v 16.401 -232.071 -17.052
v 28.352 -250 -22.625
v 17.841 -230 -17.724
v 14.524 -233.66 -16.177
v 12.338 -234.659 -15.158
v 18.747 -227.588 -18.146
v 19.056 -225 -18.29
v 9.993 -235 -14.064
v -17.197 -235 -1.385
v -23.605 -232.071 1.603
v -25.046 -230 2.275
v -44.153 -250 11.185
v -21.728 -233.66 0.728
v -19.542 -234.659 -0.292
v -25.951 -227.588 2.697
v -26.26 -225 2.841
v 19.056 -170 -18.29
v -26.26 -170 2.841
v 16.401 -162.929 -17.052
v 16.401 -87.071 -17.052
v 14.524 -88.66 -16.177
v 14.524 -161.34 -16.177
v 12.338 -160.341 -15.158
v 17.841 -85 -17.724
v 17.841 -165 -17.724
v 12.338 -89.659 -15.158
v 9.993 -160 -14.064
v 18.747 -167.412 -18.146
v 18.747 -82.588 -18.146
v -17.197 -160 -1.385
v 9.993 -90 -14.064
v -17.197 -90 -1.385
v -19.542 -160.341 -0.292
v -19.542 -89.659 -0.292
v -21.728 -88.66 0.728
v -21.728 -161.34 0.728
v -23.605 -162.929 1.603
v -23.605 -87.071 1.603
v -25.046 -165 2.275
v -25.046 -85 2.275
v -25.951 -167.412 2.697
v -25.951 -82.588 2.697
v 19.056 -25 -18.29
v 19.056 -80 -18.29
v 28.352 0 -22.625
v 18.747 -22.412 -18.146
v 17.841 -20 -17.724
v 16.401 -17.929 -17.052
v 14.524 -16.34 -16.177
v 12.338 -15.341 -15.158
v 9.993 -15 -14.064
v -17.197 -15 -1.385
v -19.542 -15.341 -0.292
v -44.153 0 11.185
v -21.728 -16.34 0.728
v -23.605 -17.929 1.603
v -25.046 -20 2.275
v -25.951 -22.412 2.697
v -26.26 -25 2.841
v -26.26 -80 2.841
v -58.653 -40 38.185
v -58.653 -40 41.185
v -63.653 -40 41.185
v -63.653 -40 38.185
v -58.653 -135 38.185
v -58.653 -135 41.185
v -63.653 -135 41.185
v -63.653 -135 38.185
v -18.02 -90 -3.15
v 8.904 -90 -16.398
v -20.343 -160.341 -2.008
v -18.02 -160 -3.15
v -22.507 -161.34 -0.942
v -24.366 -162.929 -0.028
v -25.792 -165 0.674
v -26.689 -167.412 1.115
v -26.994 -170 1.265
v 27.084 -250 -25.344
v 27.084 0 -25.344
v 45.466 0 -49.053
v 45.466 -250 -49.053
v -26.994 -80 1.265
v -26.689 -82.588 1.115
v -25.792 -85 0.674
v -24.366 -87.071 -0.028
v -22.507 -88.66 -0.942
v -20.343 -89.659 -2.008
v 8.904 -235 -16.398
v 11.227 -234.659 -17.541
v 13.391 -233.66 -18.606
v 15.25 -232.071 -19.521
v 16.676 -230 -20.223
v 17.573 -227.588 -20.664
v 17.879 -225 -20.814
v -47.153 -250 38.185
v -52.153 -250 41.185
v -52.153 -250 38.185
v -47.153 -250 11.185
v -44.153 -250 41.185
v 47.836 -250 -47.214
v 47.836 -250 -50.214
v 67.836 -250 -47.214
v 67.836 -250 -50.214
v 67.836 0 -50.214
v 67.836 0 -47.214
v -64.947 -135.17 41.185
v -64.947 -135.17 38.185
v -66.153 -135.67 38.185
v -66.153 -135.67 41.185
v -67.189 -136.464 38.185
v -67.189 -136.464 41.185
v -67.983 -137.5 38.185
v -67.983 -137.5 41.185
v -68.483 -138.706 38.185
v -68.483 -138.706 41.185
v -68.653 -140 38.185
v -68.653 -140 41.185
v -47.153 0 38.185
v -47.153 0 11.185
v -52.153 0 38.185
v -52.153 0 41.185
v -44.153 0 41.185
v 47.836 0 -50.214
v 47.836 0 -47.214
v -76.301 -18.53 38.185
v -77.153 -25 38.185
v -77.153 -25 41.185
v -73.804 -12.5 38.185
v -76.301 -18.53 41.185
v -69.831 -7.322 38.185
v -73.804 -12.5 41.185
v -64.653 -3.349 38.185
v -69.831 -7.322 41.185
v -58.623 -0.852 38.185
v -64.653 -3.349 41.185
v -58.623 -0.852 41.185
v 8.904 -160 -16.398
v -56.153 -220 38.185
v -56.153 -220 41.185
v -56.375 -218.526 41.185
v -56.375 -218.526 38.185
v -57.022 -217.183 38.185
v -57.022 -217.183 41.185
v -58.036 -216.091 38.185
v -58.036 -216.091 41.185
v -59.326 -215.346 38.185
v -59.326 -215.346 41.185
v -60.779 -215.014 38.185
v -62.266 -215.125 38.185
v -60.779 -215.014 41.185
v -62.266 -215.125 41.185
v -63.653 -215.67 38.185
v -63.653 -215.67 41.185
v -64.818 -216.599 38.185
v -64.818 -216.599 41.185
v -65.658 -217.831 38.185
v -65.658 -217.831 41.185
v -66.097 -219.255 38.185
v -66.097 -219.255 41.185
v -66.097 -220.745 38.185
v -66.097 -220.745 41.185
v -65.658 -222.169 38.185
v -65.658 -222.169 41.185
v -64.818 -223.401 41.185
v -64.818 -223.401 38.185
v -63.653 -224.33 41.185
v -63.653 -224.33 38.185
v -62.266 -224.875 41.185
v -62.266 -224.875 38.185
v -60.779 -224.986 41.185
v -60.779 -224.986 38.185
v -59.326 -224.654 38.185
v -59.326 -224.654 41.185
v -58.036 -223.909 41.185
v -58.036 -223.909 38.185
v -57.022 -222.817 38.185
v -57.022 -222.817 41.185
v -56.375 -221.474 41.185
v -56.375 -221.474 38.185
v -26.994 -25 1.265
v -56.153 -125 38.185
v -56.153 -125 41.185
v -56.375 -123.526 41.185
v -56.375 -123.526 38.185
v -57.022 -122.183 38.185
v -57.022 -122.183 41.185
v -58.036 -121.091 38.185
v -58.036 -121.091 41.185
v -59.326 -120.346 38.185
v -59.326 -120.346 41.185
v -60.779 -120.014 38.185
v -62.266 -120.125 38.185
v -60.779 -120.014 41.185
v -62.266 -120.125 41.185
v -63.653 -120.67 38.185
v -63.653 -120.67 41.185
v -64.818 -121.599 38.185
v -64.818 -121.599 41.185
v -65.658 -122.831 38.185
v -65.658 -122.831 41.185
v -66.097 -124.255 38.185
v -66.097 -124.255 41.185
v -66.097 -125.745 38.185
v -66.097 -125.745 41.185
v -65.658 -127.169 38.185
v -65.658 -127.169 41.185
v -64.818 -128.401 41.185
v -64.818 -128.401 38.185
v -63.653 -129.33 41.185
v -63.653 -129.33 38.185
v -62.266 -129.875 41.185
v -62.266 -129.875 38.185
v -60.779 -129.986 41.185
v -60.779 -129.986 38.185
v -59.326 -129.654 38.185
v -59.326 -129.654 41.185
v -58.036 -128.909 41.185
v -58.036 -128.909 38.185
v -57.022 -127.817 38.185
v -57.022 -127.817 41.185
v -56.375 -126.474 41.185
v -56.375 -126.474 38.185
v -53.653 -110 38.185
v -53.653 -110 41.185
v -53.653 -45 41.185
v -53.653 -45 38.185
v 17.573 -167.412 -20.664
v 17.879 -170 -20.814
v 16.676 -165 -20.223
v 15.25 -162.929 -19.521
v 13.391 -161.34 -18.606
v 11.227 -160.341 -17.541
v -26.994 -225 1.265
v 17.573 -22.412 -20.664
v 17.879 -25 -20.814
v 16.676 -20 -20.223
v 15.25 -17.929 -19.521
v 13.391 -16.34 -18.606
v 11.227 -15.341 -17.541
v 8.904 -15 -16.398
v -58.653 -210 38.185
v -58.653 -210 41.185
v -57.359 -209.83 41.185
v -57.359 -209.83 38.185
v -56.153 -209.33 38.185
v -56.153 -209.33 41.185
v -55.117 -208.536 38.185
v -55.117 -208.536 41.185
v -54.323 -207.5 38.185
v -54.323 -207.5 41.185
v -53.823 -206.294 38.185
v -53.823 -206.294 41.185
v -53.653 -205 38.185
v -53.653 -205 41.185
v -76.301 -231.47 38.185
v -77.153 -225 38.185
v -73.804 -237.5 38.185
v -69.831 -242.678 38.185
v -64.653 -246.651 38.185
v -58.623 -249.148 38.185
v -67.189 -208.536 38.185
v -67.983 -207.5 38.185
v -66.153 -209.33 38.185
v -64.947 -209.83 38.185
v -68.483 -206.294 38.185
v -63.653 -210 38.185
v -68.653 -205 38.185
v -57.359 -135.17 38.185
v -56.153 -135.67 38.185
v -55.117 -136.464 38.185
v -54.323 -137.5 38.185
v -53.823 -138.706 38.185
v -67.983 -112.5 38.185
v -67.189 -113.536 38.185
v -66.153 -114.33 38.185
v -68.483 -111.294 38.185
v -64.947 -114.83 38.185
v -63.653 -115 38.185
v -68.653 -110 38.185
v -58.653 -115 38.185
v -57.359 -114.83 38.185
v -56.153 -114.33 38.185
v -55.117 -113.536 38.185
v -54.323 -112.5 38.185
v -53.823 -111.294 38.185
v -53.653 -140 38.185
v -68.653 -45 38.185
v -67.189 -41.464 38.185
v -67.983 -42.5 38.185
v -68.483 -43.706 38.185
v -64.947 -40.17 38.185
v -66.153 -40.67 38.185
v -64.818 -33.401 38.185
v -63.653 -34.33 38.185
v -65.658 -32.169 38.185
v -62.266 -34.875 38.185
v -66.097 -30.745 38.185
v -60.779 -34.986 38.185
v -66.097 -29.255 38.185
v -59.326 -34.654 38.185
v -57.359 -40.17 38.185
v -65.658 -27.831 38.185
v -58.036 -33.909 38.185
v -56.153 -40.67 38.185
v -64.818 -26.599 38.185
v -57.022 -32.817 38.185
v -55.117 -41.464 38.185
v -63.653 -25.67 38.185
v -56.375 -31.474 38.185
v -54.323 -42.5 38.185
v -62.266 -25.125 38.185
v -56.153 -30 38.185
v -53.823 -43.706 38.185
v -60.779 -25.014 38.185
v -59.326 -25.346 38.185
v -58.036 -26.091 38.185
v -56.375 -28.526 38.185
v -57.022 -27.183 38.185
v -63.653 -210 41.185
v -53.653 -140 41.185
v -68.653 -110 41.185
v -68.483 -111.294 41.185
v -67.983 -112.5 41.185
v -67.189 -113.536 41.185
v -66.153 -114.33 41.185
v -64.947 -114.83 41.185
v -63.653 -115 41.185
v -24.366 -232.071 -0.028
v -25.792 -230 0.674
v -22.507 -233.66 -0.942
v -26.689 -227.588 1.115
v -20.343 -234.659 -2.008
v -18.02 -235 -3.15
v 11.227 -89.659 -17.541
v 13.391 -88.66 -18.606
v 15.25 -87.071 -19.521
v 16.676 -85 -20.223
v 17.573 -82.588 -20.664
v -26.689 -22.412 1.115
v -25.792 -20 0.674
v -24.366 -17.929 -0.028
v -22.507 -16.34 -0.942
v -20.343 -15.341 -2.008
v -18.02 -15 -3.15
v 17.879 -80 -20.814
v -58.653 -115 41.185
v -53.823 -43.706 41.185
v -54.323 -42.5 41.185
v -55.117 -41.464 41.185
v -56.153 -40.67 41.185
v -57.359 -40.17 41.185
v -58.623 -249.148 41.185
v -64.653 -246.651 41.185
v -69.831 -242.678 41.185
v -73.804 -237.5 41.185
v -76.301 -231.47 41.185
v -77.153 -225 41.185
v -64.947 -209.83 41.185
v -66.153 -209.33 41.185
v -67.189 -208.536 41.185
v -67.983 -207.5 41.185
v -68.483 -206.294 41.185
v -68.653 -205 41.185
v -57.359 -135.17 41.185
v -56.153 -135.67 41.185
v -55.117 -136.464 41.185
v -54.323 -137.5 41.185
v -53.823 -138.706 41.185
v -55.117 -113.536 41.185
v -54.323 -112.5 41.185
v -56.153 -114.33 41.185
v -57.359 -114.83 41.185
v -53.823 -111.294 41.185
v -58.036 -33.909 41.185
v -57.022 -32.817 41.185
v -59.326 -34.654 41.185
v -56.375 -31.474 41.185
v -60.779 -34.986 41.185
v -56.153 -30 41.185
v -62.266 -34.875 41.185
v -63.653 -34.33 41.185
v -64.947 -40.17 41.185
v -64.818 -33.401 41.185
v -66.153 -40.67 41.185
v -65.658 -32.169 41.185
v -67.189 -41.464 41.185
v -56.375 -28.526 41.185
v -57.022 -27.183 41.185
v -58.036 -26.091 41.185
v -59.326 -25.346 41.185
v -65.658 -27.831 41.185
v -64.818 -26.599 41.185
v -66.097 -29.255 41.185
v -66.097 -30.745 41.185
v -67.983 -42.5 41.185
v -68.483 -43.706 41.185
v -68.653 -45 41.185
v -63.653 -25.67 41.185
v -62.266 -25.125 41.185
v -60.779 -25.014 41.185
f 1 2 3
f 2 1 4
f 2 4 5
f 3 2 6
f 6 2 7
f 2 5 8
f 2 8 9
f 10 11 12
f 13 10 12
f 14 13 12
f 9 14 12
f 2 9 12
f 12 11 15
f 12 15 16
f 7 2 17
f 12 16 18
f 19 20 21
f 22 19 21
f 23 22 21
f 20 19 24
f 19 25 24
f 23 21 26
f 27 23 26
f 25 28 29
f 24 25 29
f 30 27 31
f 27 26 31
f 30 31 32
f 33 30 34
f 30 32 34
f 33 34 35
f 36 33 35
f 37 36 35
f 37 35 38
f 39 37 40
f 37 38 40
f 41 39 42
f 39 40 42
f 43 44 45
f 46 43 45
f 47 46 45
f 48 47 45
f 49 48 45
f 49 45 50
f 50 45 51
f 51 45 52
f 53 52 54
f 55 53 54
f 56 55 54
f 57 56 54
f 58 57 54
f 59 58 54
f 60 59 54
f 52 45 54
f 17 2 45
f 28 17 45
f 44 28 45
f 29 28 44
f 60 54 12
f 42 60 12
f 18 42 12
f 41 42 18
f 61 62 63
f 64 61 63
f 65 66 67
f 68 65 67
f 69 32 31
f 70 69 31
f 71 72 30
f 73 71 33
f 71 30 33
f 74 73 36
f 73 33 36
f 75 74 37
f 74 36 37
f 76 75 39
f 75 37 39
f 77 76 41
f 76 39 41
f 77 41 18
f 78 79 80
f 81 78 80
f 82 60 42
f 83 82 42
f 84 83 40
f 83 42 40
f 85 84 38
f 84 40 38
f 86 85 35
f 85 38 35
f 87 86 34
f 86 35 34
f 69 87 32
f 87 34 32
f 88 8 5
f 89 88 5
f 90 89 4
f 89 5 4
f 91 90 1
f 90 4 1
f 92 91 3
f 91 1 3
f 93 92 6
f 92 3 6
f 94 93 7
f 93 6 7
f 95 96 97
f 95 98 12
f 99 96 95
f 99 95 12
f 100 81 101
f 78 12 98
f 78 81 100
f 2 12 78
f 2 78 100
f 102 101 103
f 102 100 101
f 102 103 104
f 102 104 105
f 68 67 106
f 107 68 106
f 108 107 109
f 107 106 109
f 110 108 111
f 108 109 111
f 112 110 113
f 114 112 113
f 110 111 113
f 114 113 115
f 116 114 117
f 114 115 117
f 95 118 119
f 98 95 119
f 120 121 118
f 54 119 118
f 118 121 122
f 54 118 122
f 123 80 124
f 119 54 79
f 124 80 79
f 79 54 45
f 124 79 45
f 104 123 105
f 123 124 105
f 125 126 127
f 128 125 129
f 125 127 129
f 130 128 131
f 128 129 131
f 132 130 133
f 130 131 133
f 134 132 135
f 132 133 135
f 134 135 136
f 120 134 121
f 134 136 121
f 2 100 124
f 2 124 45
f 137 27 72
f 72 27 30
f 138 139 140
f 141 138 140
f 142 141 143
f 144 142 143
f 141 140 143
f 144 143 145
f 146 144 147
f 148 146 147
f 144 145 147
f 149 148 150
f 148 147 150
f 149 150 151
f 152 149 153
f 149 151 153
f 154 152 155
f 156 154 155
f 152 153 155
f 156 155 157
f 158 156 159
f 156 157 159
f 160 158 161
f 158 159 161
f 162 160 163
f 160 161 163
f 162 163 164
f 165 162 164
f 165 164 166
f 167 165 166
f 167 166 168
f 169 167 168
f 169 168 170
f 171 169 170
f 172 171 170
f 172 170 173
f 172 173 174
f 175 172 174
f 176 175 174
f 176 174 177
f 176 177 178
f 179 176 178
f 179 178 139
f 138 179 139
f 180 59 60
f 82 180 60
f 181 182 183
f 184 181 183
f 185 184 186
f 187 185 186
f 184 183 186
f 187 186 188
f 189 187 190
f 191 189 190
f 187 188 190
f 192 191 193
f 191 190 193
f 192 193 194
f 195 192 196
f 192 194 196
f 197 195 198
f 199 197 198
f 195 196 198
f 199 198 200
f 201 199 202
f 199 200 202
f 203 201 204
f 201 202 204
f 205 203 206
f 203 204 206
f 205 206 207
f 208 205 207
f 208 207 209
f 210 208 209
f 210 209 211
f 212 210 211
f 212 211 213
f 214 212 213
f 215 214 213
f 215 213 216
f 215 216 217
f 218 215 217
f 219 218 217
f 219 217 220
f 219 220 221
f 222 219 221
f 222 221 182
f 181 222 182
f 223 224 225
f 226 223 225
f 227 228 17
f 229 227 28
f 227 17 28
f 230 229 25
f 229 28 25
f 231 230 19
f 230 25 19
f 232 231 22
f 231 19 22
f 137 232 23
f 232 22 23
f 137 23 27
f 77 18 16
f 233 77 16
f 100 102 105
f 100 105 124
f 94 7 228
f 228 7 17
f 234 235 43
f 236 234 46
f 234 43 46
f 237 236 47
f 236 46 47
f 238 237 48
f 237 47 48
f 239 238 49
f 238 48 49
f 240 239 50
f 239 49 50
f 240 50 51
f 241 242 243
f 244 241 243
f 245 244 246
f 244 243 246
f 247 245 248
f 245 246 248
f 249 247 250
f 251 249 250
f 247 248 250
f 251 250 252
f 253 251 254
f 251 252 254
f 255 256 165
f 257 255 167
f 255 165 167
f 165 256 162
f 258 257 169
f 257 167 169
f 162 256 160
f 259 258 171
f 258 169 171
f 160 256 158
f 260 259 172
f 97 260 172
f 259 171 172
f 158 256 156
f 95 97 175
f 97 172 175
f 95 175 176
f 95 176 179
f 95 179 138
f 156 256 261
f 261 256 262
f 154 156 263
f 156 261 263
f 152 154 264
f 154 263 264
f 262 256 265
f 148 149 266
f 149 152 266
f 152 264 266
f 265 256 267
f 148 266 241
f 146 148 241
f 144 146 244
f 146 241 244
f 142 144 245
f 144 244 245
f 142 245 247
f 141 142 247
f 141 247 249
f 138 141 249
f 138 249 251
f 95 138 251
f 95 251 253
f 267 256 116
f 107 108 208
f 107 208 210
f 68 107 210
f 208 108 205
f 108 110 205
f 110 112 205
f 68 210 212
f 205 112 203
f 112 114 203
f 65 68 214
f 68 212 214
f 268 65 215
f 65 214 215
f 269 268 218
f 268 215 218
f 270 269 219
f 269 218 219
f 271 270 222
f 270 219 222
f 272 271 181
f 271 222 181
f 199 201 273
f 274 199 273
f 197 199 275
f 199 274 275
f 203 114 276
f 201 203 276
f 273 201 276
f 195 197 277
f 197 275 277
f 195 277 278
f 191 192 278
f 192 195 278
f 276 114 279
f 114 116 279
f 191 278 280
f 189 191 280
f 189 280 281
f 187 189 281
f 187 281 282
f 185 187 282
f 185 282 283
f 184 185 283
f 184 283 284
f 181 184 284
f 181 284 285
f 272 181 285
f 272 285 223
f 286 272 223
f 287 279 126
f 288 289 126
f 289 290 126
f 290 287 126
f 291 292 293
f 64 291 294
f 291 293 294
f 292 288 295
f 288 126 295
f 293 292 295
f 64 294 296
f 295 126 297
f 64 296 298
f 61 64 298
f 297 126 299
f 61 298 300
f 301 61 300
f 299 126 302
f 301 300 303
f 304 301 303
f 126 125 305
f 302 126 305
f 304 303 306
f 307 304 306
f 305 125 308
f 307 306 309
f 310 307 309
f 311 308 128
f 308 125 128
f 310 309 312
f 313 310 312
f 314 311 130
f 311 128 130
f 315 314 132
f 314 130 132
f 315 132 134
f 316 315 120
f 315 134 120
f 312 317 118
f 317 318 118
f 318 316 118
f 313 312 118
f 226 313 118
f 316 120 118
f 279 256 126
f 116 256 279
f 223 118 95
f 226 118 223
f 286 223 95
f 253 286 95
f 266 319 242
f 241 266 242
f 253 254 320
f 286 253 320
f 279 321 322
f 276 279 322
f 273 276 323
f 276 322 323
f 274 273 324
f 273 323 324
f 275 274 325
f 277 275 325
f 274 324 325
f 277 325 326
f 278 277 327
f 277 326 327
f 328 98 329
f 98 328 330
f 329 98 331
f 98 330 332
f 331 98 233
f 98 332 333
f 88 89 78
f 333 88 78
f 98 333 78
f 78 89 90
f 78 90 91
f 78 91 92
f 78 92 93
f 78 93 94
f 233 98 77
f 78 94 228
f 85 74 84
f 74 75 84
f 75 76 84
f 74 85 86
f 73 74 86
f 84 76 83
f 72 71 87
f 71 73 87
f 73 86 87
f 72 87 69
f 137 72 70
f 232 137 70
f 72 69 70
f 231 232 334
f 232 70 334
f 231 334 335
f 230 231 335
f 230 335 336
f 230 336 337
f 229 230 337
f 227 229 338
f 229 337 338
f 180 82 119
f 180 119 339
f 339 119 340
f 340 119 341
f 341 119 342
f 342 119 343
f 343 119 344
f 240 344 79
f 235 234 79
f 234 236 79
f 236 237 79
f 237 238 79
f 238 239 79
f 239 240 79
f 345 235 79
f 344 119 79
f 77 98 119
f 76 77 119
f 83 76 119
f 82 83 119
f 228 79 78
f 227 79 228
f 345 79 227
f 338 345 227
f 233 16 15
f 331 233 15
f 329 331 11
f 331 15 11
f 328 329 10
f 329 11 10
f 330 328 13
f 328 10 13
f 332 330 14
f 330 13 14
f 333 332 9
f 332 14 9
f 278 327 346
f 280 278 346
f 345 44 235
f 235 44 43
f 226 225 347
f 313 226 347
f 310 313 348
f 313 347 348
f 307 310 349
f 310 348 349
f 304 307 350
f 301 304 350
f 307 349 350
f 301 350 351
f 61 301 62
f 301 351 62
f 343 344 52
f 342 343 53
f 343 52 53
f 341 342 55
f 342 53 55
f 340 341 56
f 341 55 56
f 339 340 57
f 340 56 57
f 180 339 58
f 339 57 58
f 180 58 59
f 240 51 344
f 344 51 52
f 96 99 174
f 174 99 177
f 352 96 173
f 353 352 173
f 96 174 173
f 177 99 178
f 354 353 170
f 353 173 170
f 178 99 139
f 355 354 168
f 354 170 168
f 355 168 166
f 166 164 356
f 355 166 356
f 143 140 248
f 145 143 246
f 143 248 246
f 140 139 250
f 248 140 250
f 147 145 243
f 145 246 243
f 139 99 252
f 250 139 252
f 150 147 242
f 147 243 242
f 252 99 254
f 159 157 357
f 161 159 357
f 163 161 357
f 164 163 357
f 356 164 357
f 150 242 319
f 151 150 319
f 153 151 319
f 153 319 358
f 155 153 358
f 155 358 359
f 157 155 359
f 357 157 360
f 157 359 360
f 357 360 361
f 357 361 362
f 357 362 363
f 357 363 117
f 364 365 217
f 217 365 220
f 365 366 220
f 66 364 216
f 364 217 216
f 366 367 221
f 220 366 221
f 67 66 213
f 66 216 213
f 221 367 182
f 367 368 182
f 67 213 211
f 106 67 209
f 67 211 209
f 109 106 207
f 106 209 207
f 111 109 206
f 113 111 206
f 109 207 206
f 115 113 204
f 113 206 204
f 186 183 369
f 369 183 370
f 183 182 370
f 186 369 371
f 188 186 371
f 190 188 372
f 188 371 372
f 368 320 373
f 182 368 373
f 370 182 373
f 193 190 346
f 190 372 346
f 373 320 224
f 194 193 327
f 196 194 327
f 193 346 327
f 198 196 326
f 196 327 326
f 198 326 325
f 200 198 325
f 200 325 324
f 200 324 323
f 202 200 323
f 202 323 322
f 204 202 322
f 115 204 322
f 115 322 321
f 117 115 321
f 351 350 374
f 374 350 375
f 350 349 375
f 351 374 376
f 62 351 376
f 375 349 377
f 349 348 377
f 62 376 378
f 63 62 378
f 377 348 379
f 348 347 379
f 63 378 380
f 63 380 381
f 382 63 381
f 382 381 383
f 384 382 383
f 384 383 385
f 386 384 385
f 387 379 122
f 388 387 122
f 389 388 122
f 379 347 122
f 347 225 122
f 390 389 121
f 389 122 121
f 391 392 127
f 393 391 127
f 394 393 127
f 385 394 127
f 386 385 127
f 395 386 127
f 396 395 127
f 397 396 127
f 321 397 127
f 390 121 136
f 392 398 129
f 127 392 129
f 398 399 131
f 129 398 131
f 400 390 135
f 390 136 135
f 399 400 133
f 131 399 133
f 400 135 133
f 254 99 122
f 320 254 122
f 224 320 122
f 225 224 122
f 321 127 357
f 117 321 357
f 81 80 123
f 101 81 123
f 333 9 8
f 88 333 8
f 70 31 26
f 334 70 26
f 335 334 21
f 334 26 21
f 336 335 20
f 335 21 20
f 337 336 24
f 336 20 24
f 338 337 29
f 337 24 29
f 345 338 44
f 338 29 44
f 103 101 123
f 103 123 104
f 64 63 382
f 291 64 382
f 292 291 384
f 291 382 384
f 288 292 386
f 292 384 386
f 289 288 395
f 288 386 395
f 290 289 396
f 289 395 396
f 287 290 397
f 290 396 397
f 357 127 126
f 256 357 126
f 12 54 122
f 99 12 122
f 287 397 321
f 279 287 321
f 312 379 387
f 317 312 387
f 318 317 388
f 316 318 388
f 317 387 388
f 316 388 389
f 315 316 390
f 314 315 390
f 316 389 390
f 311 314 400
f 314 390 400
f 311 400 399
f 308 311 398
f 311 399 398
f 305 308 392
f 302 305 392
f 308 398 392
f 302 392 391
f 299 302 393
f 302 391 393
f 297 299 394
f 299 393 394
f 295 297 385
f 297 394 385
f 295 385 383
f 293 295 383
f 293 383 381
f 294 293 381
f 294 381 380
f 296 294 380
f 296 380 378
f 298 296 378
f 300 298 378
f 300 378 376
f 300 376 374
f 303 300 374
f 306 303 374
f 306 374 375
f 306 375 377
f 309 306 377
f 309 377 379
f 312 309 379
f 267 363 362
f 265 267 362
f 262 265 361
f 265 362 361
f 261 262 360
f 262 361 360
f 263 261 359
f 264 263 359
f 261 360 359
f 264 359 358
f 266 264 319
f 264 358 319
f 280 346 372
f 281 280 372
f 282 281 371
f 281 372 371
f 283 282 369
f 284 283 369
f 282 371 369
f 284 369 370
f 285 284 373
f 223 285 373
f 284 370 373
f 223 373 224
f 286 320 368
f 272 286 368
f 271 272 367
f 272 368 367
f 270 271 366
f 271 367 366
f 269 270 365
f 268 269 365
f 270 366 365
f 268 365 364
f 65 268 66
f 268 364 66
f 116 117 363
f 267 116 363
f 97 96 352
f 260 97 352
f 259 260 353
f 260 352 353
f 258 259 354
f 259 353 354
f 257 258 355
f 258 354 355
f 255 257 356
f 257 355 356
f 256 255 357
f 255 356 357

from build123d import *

# Parameters (mm, degrees)
F1_DEPTH  = 250
F2_R      = 5
F3_DEPTH  = 25
F5_DEPTH  = 25
F7_DEPTH  = 25
F10_DEPTH = 100


with BuildPart() as f1:
    # F0 (on Front) → F1 (new body)
    with BuildSketch(Plane.XZ):
        Polygon((-47.1529836208, 41.1845914816), (-77.1529836208, 41.1845914816), (-77.1529836208, 38.1845914816), (-47.1529836208, 38.1845914816), (-47.1529836208, 11.1845914816), (27.0837845569, -25.3437928188), (45.465561148, -49.0526580248), (47.8364476686, -50.2144803657), (67.8364476686, -50.2144803657), (67.8364476686, -47.2144803657), (47.8364476686, -47.2144803657), (28.3516393422, -22.6248694577), (-44.1529836208, 11.1845914816), (-44.1529836208, 41.1845914816), align=None)
    extrude(amount=F1_DEPTH)

    # F2 (on face) → F3 (cut)
    with BuildSketch(Plane.XY.offset(41.1845914816)):
        with Locations((-61.1529836208, -30)):
            Circle(F2_R)
        with Locations((-61.1529836208, -125)):
            Circle(F2_R)
        with Locations((-61.1529836208, -220)):
            Circle(F2_R)
    extrude(amount=-F3_DEPTH, mode=Mode.SUBTRACT)

    # F4 (on face) → F5 (cut)
    with BuildSketch(Plane.XY.offset(41.1845914816)):
        with BuildLine():
            ThreePointArc((-77.1529836208, -25), (-69.8306531504, -7.3223304703), (-52.1529836208, 0))
            Line((-52.1529836208, 0), (-77.1529836208, 0))
            Line((-77.1529836208, 0), (-77.1529836208, -25))
        make_face()
        with BuildLine():
            Line((-77.1529836208, -250), (-52.1529836208, -250))
            ThreePointArc((-52.1529836208, -250), (-69.8306531504, -242.6776695297), (-77.1529836208, -225))
            Line((-77.1529836208, -225), (-77.1529836208, -250))
        make_face()
    extrude(amount=-F5_DEPTH, mode=Mode.SUBTRACT)

    # F6 (on face) → F7 (cut)
    with BuildSketch(Plane.XY.offset(41.1845914816)):
        with BuildLine():
            Line((-58.6529836208, -40), (-63.6529836208, -40))
            ThreePointArc((-63.6529836208, -40), (-67.1885175267, -41.4644660941), (-68.6529836208, -45))
            Line((-68.6529836208, -45), (-68.6529836208, -110))
            ThreePointArc((-68.6529836208, -110), (-67.1885175267, -113.5355339059), (-63.6529836208, -115))
            Line((-63.6529836208, -115), (-58.6529836208, -115))
            ThreePointArc((-58.6529836208, -115), (-55.1174497148, -113.5355339059), (-53.6529836208, -110))
            Line((-53.6529836208, -110), (-53.6529836208, -45))
            ThreePointArc((-53.6529836208, -45), (-55.1174497148, -41.4644660941), (-58.6529836208, -40))
        make_face()
        with BuildLine():
            Line((-58.6529836208, -135), (-63.6529836208, -135))
            ThreePointArc((-63.6529836208, -135), (-67.1885175267, -136.4644660941), (-68.6529836208, -140))
            Line((-68.6529836208, -140), (-68.6529836208, -205))
            ThreePointArc((-68.6529836208, -205), (-67.1885175267, -208.5355339059), (-63.6529836208, -210))
            Line((-63.6529836208, -210), (-58.6529836208, -210))
            ThreePointArc((-58.6529836208, -210), (-55.1174497148, -208.5355339059), (-53.6529836208, -205))
            Line((-53.6529836208, -205), (-53.6529836208, -140))
            ThreePointArc((-53.6529836208, -140), (-55.1174497148, -136.4644660941), (-58.6529836208, -135))
        make_face()
    extrude(amount=-F7_DEPTH, mode=Mode.SUBTRACT)

    # F9 (on offset) → F10 (cut)
    with BuildSketch(Plane(origin=(6.9634072107, 0, 14.9330749537), x_dir=(0.906307787, 0, -0.4226182617), z_dir=(0.4226182617, 0, 0.906307787))):
        with BuildLine():
            Line((15, -15), (-15, -15))
            ThreePointArc((-15, -15), (-22.0710678119, -17.9289321881), (-25, -25))
            Line((-25, -25), (-25, -80))
            ThreePointArc((-25, -80), (-22.0710678119, -87.0710678119), (-15, -90))
            Line((-15, -90), (15, -90))
            ThreePointArc((15, -90), (22.0710678119, -87.0710678119), (25, -80))
            Line((25, -80), (25, -25))
            ThreePointArc((25, -25), (22.0710678119, -17.9289321881), (15, -15))
        make_face()
        with BuildLine():
            Line((15, -160), (-15, -160))
            ThreePointArc((-15, -160), (-22.0710678119, -162.9289321881), (-25, -170))
            Line((-25, -170), (-25, -225))
            ThreePointArc((-25, -225), (-22.0710678119, -232.0710678119), (-15, -235))
            Line((-15, -235), (15, -235))
            ThreePointArc((15, -235), (22.0710678119, -232.0710678119), (25, -225))
            Line((25, -225), (25, -170))
            ThreePointArc((25, -170), (22.0710678119, -162.9289321881), (15, -160))
        make_face()
    extrude(amount=-F10_DEPTH, mode=Mode.SUBTRACT)


solid = f1.part
